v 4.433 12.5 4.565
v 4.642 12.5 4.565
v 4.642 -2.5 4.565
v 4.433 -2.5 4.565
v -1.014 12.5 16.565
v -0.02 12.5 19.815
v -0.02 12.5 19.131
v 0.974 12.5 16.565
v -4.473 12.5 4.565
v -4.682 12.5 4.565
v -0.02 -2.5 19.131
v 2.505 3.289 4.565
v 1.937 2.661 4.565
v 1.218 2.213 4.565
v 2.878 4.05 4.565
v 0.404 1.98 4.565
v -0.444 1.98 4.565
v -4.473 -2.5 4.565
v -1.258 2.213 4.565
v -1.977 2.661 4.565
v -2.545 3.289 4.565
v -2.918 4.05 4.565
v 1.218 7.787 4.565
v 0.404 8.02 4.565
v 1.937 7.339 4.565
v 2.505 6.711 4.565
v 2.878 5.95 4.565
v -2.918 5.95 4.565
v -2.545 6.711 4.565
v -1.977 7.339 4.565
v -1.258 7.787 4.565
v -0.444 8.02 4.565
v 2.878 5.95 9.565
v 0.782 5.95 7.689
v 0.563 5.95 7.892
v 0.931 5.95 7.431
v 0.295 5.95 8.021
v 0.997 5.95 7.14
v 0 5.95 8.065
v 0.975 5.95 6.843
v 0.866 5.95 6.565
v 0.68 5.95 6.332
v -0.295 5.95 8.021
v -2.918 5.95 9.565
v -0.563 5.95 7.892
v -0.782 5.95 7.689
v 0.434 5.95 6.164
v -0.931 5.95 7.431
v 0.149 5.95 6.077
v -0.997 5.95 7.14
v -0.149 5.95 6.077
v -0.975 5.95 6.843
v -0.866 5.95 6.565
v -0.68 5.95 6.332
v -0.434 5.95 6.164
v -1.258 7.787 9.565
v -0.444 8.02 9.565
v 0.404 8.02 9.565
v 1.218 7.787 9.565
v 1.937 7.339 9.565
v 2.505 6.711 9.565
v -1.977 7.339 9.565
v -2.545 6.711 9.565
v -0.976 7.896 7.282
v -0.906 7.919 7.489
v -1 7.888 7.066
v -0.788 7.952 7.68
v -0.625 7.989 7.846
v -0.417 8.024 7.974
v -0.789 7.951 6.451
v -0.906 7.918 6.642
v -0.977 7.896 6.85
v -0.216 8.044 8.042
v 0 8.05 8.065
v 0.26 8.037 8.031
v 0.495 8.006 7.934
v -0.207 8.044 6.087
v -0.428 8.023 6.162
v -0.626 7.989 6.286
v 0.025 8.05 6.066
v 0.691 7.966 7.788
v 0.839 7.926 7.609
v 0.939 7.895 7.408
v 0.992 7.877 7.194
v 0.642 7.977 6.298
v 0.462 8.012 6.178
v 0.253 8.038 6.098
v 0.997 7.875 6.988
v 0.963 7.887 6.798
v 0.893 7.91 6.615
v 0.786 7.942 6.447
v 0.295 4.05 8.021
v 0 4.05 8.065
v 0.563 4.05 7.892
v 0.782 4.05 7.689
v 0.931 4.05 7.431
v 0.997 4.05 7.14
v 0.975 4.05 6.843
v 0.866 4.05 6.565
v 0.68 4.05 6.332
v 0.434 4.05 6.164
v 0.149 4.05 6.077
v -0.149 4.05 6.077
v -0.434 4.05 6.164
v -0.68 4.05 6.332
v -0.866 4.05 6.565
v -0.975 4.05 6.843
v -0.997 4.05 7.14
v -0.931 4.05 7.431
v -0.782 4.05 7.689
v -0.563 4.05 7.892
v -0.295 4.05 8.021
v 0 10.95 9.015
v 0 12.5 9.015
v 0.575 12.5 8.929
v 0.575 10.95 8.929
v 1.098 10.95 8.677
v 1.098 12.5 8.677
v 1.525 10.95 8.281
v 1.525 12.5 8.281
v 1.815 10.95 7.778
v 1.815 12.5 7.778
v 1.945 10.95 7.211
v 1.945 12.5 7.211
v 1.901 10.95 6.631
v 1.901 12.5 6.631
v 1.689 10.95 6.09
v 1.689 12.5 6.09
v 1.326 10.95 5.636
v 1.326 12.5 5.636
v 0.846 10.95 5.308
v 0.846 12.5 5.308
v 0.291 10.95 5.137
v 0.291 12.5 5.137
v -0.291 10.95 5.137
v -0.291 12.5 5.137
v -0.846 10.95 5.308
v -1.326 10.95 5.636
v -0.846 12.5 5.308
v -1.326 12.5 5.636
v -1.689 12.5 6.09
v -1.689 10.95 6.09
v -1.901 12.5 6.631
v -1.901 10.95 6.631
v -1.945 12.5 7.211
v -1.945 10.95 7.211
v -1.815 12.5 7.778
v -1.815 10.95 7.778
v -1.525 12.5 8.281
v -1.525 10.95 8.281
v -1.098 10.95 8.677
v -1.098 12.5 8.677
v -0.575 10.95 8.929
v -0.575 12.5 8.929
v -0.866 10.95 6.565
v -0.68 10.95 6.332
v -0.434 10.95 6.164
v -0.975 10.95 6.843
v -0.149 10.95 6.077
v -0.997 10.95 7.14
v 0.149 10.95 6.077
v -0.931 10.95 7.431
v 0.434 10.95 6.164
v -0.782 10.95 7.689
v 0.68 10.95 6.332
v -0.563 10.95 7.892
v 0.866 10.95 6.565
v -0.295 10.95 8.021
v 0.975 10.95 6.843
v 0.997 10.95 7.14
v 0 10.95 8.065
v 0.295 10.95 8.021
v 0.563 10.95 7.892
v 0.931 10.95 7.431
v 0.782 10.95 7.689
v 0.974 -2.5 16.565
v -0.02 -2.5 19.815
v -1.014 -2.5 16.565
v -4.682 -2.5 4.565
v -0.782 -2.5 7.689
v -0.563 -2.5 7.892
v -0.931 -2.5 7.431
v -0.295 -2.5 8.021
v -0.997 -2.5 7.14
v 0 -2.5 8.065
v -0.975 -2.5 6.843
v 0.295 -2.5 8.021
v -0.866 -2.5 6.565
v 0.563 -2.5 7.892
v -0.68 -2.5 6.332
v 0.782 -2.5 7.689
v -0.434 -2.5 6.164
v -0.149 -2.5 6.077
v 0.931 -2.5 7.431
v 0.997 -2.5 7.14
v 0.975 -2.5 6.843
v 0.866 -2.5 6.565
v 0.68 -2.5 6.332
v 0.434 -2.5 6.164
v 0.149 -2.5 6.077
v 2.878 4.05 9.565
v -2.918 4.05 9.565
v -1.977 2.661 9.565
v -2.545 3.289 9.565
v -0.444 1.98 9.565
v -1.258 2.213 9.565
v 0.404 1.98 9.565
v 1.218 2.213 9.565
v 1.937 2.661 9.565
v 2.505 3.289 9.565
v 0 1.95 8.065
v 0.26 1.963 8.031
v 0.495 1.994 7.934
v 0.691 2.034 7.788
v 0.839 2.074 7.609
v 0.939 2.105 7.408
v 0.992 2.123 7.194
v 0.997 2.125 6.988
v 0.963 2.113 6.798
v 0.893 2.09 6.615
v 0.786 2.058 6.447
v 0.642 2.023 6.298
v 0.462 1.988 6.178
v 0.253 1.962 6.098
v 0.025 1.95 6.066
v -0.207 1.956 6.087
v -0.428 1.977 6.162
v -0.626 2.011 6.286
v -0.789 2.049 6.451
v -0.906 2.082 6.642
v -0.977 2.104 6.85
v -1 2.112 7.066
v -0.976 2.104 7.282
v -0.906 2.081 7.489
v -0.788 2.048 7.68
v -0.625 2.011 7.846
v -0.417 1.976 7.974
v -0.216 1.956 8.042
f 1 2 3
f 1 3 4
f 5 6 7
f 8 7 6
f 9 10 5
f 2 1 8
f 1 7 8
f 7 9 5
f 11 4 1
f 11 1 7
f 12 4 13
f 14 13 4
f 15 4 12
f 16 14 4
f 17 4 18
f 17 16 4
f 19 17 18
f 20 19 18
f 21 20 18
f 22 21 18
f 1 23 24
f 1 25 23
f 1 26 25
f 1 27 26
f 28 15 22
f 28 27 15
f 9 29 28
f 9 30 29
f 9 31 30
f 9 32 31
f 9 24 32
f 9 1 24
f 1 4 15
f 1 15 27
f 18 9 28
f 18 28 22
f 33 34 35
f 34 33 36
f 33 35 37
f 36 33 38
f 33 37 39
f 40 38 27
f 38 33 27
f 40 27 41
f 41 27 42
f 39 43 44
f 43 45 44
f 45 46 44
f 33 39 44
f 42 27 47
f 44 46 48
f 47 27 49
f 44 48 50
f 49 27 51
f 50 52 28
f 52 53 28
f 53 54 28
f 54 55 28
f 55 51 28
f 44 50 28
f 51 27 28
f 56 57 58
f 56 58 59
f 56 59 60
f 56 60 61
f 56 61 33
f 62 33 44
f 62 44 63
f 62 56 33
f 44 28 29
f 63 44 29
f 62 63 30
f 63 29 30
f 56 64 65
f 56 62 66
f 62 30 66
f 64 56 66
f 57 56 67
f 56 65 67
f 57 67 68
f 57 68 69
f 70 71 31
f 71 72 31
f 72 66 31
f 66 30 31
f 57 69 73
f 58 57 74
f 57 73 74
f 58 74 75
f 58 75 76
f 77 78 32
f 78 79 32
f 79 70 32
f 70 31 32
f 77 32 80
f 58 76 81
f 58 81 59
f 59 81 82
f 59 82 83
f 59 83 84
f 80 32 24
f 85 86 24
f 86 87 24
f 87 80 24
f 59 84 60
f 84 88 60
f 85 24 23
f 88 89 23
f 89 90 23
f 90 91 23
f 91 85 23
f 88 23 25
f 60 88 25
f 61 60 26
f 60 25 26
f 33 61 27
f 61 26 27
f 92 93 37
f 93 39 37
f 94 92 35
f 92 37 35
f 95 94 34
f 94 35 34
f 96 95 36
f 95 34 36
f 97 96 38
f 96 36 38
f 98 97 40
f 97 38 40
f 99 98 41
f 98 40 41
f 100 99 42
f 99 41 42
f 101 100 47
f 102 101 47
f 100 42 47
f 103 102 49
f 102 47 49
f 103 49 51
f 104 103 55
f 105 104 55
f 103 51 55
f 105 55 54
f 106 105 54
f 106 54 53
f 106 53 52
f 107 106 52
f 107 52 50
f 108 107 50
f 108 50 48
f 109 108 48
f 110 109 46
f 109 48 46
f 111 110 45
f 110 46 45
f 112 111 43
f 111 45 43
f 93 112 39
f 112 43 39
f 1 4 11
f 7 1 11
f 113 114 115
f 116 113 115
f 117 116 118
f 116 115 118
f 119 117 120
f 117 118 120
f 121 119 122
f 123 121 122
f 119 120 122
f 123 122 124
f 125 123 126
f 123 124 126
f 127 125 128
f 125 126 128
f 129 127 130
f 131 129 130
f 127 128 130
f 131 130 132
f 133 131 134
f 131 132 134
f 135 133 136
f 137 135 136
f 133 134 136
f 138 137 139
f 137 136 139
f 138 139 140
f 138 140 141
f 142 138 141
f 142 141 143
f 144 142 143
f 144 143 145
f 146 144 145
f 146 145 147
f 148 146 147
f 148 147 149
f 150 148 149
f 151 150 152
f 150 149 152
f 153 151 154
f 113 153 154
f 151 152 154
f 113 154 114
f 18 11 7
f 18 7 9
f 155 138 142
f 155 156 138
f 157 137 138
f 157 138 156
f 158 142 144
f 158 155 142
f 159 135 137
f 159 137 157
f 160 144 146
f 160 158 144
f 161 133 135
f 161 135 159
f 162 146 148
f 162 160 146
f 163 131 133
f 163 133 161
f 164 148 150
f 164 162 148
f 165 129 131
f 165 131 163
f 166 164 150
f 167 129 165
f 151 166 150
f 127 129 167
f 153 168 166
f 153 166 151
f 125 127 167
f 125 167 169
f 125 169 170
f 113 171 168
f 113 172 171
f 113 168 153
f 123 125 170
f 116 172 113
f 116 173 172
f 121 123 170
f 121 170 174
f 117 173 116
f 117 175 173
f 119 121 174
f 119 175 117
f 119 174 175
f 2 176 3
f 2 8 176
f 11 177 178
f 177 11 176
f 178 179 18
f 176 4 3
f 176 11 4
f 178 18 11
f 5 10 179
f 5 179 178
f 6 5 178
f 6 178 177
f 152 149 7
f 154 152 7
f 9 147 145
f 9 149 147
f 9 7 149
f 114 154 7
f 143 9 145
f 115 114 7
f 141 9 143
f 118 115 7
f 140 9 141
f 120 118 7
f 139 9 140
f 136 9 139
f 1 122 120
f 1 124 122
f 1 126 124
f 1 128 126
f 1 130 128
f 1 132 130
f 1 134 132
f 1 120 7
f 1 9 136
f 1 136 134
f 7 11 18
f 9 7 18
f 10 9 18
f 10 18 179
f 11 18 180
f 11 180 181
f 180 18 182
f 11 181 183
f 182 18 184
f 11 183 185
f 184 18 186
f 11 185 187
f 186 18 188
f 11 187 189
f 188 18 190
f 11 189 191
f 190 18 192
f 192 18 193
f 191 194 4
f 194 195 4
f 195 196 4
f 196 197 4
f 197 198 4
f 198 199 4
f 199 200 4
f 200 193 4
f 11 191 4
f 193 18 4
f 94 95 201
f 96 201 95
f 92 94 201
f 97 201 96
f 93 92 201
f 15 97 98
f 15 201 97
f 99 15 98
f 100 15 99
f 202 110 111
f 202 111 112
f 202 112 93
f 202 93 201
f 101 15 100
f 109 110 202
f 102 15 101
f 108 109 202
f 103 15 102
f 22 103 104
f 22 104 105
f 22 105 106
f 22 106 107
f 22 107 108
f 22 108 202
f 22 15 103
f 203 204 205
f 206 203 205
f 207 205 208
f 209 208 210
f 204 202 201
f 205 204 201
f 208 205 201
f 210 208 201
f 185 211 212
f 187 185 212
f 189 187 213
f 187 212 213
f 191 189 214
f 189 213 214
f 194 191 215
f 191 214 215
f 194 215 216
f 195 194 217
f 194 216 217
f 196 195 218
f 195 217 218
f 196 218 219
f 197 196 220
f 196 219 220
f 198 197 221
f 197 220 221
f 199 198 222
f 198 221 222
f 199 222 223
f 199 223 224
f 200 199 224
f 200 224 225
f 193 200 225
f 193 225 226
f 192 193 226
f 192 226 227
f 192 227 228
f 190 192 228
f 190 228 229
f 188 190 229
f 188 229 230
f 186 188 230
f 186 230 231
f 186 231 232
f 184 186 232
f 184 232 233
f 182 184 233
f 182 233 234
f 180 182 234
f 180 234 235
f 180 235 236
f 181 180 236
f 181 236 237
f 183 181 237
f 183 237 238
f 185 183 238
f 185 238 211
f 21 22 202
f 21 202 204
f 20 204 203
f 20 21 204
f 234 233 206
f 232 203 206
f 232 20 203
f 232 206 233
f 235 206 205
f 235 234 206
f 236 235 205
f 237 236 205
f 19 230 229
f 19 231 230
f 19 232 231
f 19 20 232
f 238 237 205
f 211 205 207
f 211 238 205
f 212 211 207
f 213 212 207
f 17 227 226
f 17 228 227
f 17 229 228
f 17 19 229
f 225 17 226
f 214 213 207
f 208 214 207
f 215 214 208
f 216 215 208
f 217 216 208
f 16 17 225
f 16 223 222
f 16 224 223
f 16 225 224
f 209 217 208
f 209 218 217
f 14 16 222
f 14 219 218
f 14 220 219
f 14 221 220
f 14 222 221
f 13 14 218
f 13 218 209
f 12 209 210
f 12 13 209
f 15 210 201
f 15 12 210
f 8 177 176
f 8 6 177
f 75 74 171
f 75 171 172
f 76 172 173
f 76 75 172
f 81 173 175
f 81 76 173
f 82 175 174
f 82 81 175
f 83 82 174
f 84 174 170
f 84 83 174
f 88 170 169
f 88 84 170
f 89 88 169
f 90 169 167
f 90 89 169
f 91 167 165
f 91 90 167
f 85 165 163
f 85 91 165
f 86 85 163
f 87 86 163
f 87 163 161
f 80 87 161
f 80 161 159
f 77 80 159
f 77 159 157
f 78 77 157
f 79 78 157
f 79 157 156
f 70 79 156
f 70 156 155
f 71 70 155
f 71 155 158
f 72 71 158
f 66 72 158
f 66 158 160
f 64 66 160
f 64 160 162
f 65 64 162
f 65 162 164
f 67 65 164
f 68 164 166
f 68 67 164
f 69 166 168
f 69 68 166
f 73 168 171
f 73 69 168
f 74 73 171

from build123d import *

# Parameters (mm, degrees)
BOSS_EXTRUDE1_DEPTH      = 12.5
BOSS_EXTRUDE1_DEPTH_BACK = 2.5
CUT_EXTRUDE1_DEPTH       = 5
SKETCH5_R                = 1
CUT_EXTRUDE2_DEPTH       = 22.965235397
CUT_EXTRUDE2_DEPTH_BACK  = 22.965235397
SKETCH6_R                = 1.95
CUT_EXTRUDE3_DEPTH       = 1.55
SPLIT2_SURFACE_1_BACK    = 24.335
SPLIT2_SURFACE_1_DEPTH   = 48.67
SPLIT2_SURFACE_2_BACK    = 24.335
SPLIT2_SURFACE_2_DEPTH   = 48.67


with BuildPart() as part:
    # Sketch1 → Boss-Extrude1 (new, two sides)
    with BuildSketch(Plane(origin=(0, 0, 0), x_dir=(1, 0, 0), z_dir=(0, 1, 0))) as boss_extrude1_sk:
        Polygon((4.642363604, -4.565370009), (-4.68242218, -4.565370009), (-1.013654003, -16.565370009), (-0.020029288, -19.815370009), (0.973595427, -16.565370009), align=None)
    extrude(amount=BOSS_EXTRUDE1_DEPTH)
    extrude(boss_extrude1_sk.sketch, amount=-BOSS_EXTRUDE1_DEPTH_BACK)

    # Sketch2 → Cut-Extrude1 (cut)
    with BuildSketch(Plane(origin=(0, 0, 4.565370009), x_dir=(-1, 0, 0), z_dir=(0, 0, -1))):
        with BuildLine():
            Line((-2.878246061, 5.95), (2.918304637, 5.95))
            ThreePointArc((2.918304637, 5.95), (0.020029288, 8.05), (-2.878246061, 5.95))
        make_face()
        with BuildLine():
            Line((-2.878246061, 4.05), (2.918304637, 4.05))
            ThreePointArc((2.918304637, 4.05), (0.020029288, 1.95), (-2.878246061, 4.05))
        make_face()
    extrude(amount=-CUT_EXTRUDE1_DEPTH, mode=Mode.SUBTRACT)

    # Sketch5 → Cut-Extrude2 (cut, two sides)
    with BuildSketch(Plane(origin=(0, 5.74, 0), x_dir=(1, 0, 0), z_dir=(0, 1, 0))) as cut_extrude2_sk:
        with Locations(Location((0, -7.065370009, 0), (0, 0, 270))):
            Circle(SKETCH5_R)
    extrude(amount=CUT_EXTRUDE2_DEPTH, mode=Mode.SUBTRACT)
    extrude(cut_extrude2_sk.sketch, amount=-CUT_EXTRUDE2_DEPTH_BACK, mode=Mode.SUBTRACT)

    # Sketch6 → Cut-Extrude3 (cut)
    with BuildSketch(Plane(origin=(0, 12.5, 0), x_dir=(1, 0, 0), z_dir=(0, 1, 0))):
        with Locations(Location((0, -7.065370009, 0), (0, 0, 270))):
            Circle(SKETCH6_R)
    extrude(amount=-CUT_EXTRUDE3_DEPTH, mode=Mode.SUBTRACT)


with BuildPart() as body_2:
    # Split2: the piece behind the surface
    add(part.part)
    # Split2 surface: a surface, the sketch's curves swept straight by 48.67 mm
    with BuildLine(Plane(origin=(0, 12.5, 0), x_dir=(1, 0, 0), z_dir=(0, 1, 0)).offset(-SPLIT2_SURFACE_1_BACK), mode=Mode.PRIVATE) as split2_surface_1_path:
        Line((-4.68242218, -4.565370009), (-0.020029288, -19.815370009))
        Line((-0.020029288, -19.815370009), (4.642363604, -4.565370009))
        Line((4.642363604, -4.565370009), (4.433225253, -4.565370009))
        Line((4.433225253, -4.565370009), (-0.020029288, -19.131309285))
        Line((-0.020029288, -19.131309285), (-4.473283829, -4.565370009))
        Line((-4.473283829, -4.565370009), (-4.68242218, -4.565370009))
    split2_surface_1 = Shell.extrude(split2_surface_1_path.wire(), (0 * SPLIT2_SURFACE_1_DEPTH, 1 * SPLIT2_SURFACE_1_DEPTH, 0 * SPLIT2_SURFACE_1_DEPTH))
    split(bisect_by=split2_surface_1, keep=Keep.BOTTOM)


with BuildPart() as part_1:
    add(part.part)

    # Split2: split by a surface, the side it looks to stays
    # Split2 surface: a surface, the sketch's curves swept straight by 48.67 mm
    with BuildLine(Plane(origin=(0, 12.5, 0), x_dir=(1, 0, 0), z_dir=(0, 1, 0)).offset(-SPLIT2_SURFACE_2_BACK), mode=Mode.PRIVATE) as split2_surface_2_path:
        Line((-4.68242218, -4.565370009), (-0.020029288, -19.815370009))
        Line((-0.020029288, -19.815370009), (4.642363604, -4.565370009))
        Line((4.642363604, -4.565370009), (4.433225253, -4.565370009))
        Line((4.433225253, -4.565370009), (-0.020029288, -19.131309285))
        Line((-0.020029288, -19.131309285), (-4.473283829, -4.565370009))
        Line((-4.473283829, -4.565370009), (-4.68242218, -4.565370009))
    split2_surface_2 = Shell.extrude(split2_surface_2_path.wire(), (0 * SPLIT2_SURFACE_2_DEPTH, 1 * SPLIT2_SURFACE_2_DEPTH, 0 * SPLIT2_SURFACE_2_DEPTH))
    split(bisect_by=split2_surface_2, keep=Keep.TOP)


solid = Compound([body_2.part, part_1.part])
